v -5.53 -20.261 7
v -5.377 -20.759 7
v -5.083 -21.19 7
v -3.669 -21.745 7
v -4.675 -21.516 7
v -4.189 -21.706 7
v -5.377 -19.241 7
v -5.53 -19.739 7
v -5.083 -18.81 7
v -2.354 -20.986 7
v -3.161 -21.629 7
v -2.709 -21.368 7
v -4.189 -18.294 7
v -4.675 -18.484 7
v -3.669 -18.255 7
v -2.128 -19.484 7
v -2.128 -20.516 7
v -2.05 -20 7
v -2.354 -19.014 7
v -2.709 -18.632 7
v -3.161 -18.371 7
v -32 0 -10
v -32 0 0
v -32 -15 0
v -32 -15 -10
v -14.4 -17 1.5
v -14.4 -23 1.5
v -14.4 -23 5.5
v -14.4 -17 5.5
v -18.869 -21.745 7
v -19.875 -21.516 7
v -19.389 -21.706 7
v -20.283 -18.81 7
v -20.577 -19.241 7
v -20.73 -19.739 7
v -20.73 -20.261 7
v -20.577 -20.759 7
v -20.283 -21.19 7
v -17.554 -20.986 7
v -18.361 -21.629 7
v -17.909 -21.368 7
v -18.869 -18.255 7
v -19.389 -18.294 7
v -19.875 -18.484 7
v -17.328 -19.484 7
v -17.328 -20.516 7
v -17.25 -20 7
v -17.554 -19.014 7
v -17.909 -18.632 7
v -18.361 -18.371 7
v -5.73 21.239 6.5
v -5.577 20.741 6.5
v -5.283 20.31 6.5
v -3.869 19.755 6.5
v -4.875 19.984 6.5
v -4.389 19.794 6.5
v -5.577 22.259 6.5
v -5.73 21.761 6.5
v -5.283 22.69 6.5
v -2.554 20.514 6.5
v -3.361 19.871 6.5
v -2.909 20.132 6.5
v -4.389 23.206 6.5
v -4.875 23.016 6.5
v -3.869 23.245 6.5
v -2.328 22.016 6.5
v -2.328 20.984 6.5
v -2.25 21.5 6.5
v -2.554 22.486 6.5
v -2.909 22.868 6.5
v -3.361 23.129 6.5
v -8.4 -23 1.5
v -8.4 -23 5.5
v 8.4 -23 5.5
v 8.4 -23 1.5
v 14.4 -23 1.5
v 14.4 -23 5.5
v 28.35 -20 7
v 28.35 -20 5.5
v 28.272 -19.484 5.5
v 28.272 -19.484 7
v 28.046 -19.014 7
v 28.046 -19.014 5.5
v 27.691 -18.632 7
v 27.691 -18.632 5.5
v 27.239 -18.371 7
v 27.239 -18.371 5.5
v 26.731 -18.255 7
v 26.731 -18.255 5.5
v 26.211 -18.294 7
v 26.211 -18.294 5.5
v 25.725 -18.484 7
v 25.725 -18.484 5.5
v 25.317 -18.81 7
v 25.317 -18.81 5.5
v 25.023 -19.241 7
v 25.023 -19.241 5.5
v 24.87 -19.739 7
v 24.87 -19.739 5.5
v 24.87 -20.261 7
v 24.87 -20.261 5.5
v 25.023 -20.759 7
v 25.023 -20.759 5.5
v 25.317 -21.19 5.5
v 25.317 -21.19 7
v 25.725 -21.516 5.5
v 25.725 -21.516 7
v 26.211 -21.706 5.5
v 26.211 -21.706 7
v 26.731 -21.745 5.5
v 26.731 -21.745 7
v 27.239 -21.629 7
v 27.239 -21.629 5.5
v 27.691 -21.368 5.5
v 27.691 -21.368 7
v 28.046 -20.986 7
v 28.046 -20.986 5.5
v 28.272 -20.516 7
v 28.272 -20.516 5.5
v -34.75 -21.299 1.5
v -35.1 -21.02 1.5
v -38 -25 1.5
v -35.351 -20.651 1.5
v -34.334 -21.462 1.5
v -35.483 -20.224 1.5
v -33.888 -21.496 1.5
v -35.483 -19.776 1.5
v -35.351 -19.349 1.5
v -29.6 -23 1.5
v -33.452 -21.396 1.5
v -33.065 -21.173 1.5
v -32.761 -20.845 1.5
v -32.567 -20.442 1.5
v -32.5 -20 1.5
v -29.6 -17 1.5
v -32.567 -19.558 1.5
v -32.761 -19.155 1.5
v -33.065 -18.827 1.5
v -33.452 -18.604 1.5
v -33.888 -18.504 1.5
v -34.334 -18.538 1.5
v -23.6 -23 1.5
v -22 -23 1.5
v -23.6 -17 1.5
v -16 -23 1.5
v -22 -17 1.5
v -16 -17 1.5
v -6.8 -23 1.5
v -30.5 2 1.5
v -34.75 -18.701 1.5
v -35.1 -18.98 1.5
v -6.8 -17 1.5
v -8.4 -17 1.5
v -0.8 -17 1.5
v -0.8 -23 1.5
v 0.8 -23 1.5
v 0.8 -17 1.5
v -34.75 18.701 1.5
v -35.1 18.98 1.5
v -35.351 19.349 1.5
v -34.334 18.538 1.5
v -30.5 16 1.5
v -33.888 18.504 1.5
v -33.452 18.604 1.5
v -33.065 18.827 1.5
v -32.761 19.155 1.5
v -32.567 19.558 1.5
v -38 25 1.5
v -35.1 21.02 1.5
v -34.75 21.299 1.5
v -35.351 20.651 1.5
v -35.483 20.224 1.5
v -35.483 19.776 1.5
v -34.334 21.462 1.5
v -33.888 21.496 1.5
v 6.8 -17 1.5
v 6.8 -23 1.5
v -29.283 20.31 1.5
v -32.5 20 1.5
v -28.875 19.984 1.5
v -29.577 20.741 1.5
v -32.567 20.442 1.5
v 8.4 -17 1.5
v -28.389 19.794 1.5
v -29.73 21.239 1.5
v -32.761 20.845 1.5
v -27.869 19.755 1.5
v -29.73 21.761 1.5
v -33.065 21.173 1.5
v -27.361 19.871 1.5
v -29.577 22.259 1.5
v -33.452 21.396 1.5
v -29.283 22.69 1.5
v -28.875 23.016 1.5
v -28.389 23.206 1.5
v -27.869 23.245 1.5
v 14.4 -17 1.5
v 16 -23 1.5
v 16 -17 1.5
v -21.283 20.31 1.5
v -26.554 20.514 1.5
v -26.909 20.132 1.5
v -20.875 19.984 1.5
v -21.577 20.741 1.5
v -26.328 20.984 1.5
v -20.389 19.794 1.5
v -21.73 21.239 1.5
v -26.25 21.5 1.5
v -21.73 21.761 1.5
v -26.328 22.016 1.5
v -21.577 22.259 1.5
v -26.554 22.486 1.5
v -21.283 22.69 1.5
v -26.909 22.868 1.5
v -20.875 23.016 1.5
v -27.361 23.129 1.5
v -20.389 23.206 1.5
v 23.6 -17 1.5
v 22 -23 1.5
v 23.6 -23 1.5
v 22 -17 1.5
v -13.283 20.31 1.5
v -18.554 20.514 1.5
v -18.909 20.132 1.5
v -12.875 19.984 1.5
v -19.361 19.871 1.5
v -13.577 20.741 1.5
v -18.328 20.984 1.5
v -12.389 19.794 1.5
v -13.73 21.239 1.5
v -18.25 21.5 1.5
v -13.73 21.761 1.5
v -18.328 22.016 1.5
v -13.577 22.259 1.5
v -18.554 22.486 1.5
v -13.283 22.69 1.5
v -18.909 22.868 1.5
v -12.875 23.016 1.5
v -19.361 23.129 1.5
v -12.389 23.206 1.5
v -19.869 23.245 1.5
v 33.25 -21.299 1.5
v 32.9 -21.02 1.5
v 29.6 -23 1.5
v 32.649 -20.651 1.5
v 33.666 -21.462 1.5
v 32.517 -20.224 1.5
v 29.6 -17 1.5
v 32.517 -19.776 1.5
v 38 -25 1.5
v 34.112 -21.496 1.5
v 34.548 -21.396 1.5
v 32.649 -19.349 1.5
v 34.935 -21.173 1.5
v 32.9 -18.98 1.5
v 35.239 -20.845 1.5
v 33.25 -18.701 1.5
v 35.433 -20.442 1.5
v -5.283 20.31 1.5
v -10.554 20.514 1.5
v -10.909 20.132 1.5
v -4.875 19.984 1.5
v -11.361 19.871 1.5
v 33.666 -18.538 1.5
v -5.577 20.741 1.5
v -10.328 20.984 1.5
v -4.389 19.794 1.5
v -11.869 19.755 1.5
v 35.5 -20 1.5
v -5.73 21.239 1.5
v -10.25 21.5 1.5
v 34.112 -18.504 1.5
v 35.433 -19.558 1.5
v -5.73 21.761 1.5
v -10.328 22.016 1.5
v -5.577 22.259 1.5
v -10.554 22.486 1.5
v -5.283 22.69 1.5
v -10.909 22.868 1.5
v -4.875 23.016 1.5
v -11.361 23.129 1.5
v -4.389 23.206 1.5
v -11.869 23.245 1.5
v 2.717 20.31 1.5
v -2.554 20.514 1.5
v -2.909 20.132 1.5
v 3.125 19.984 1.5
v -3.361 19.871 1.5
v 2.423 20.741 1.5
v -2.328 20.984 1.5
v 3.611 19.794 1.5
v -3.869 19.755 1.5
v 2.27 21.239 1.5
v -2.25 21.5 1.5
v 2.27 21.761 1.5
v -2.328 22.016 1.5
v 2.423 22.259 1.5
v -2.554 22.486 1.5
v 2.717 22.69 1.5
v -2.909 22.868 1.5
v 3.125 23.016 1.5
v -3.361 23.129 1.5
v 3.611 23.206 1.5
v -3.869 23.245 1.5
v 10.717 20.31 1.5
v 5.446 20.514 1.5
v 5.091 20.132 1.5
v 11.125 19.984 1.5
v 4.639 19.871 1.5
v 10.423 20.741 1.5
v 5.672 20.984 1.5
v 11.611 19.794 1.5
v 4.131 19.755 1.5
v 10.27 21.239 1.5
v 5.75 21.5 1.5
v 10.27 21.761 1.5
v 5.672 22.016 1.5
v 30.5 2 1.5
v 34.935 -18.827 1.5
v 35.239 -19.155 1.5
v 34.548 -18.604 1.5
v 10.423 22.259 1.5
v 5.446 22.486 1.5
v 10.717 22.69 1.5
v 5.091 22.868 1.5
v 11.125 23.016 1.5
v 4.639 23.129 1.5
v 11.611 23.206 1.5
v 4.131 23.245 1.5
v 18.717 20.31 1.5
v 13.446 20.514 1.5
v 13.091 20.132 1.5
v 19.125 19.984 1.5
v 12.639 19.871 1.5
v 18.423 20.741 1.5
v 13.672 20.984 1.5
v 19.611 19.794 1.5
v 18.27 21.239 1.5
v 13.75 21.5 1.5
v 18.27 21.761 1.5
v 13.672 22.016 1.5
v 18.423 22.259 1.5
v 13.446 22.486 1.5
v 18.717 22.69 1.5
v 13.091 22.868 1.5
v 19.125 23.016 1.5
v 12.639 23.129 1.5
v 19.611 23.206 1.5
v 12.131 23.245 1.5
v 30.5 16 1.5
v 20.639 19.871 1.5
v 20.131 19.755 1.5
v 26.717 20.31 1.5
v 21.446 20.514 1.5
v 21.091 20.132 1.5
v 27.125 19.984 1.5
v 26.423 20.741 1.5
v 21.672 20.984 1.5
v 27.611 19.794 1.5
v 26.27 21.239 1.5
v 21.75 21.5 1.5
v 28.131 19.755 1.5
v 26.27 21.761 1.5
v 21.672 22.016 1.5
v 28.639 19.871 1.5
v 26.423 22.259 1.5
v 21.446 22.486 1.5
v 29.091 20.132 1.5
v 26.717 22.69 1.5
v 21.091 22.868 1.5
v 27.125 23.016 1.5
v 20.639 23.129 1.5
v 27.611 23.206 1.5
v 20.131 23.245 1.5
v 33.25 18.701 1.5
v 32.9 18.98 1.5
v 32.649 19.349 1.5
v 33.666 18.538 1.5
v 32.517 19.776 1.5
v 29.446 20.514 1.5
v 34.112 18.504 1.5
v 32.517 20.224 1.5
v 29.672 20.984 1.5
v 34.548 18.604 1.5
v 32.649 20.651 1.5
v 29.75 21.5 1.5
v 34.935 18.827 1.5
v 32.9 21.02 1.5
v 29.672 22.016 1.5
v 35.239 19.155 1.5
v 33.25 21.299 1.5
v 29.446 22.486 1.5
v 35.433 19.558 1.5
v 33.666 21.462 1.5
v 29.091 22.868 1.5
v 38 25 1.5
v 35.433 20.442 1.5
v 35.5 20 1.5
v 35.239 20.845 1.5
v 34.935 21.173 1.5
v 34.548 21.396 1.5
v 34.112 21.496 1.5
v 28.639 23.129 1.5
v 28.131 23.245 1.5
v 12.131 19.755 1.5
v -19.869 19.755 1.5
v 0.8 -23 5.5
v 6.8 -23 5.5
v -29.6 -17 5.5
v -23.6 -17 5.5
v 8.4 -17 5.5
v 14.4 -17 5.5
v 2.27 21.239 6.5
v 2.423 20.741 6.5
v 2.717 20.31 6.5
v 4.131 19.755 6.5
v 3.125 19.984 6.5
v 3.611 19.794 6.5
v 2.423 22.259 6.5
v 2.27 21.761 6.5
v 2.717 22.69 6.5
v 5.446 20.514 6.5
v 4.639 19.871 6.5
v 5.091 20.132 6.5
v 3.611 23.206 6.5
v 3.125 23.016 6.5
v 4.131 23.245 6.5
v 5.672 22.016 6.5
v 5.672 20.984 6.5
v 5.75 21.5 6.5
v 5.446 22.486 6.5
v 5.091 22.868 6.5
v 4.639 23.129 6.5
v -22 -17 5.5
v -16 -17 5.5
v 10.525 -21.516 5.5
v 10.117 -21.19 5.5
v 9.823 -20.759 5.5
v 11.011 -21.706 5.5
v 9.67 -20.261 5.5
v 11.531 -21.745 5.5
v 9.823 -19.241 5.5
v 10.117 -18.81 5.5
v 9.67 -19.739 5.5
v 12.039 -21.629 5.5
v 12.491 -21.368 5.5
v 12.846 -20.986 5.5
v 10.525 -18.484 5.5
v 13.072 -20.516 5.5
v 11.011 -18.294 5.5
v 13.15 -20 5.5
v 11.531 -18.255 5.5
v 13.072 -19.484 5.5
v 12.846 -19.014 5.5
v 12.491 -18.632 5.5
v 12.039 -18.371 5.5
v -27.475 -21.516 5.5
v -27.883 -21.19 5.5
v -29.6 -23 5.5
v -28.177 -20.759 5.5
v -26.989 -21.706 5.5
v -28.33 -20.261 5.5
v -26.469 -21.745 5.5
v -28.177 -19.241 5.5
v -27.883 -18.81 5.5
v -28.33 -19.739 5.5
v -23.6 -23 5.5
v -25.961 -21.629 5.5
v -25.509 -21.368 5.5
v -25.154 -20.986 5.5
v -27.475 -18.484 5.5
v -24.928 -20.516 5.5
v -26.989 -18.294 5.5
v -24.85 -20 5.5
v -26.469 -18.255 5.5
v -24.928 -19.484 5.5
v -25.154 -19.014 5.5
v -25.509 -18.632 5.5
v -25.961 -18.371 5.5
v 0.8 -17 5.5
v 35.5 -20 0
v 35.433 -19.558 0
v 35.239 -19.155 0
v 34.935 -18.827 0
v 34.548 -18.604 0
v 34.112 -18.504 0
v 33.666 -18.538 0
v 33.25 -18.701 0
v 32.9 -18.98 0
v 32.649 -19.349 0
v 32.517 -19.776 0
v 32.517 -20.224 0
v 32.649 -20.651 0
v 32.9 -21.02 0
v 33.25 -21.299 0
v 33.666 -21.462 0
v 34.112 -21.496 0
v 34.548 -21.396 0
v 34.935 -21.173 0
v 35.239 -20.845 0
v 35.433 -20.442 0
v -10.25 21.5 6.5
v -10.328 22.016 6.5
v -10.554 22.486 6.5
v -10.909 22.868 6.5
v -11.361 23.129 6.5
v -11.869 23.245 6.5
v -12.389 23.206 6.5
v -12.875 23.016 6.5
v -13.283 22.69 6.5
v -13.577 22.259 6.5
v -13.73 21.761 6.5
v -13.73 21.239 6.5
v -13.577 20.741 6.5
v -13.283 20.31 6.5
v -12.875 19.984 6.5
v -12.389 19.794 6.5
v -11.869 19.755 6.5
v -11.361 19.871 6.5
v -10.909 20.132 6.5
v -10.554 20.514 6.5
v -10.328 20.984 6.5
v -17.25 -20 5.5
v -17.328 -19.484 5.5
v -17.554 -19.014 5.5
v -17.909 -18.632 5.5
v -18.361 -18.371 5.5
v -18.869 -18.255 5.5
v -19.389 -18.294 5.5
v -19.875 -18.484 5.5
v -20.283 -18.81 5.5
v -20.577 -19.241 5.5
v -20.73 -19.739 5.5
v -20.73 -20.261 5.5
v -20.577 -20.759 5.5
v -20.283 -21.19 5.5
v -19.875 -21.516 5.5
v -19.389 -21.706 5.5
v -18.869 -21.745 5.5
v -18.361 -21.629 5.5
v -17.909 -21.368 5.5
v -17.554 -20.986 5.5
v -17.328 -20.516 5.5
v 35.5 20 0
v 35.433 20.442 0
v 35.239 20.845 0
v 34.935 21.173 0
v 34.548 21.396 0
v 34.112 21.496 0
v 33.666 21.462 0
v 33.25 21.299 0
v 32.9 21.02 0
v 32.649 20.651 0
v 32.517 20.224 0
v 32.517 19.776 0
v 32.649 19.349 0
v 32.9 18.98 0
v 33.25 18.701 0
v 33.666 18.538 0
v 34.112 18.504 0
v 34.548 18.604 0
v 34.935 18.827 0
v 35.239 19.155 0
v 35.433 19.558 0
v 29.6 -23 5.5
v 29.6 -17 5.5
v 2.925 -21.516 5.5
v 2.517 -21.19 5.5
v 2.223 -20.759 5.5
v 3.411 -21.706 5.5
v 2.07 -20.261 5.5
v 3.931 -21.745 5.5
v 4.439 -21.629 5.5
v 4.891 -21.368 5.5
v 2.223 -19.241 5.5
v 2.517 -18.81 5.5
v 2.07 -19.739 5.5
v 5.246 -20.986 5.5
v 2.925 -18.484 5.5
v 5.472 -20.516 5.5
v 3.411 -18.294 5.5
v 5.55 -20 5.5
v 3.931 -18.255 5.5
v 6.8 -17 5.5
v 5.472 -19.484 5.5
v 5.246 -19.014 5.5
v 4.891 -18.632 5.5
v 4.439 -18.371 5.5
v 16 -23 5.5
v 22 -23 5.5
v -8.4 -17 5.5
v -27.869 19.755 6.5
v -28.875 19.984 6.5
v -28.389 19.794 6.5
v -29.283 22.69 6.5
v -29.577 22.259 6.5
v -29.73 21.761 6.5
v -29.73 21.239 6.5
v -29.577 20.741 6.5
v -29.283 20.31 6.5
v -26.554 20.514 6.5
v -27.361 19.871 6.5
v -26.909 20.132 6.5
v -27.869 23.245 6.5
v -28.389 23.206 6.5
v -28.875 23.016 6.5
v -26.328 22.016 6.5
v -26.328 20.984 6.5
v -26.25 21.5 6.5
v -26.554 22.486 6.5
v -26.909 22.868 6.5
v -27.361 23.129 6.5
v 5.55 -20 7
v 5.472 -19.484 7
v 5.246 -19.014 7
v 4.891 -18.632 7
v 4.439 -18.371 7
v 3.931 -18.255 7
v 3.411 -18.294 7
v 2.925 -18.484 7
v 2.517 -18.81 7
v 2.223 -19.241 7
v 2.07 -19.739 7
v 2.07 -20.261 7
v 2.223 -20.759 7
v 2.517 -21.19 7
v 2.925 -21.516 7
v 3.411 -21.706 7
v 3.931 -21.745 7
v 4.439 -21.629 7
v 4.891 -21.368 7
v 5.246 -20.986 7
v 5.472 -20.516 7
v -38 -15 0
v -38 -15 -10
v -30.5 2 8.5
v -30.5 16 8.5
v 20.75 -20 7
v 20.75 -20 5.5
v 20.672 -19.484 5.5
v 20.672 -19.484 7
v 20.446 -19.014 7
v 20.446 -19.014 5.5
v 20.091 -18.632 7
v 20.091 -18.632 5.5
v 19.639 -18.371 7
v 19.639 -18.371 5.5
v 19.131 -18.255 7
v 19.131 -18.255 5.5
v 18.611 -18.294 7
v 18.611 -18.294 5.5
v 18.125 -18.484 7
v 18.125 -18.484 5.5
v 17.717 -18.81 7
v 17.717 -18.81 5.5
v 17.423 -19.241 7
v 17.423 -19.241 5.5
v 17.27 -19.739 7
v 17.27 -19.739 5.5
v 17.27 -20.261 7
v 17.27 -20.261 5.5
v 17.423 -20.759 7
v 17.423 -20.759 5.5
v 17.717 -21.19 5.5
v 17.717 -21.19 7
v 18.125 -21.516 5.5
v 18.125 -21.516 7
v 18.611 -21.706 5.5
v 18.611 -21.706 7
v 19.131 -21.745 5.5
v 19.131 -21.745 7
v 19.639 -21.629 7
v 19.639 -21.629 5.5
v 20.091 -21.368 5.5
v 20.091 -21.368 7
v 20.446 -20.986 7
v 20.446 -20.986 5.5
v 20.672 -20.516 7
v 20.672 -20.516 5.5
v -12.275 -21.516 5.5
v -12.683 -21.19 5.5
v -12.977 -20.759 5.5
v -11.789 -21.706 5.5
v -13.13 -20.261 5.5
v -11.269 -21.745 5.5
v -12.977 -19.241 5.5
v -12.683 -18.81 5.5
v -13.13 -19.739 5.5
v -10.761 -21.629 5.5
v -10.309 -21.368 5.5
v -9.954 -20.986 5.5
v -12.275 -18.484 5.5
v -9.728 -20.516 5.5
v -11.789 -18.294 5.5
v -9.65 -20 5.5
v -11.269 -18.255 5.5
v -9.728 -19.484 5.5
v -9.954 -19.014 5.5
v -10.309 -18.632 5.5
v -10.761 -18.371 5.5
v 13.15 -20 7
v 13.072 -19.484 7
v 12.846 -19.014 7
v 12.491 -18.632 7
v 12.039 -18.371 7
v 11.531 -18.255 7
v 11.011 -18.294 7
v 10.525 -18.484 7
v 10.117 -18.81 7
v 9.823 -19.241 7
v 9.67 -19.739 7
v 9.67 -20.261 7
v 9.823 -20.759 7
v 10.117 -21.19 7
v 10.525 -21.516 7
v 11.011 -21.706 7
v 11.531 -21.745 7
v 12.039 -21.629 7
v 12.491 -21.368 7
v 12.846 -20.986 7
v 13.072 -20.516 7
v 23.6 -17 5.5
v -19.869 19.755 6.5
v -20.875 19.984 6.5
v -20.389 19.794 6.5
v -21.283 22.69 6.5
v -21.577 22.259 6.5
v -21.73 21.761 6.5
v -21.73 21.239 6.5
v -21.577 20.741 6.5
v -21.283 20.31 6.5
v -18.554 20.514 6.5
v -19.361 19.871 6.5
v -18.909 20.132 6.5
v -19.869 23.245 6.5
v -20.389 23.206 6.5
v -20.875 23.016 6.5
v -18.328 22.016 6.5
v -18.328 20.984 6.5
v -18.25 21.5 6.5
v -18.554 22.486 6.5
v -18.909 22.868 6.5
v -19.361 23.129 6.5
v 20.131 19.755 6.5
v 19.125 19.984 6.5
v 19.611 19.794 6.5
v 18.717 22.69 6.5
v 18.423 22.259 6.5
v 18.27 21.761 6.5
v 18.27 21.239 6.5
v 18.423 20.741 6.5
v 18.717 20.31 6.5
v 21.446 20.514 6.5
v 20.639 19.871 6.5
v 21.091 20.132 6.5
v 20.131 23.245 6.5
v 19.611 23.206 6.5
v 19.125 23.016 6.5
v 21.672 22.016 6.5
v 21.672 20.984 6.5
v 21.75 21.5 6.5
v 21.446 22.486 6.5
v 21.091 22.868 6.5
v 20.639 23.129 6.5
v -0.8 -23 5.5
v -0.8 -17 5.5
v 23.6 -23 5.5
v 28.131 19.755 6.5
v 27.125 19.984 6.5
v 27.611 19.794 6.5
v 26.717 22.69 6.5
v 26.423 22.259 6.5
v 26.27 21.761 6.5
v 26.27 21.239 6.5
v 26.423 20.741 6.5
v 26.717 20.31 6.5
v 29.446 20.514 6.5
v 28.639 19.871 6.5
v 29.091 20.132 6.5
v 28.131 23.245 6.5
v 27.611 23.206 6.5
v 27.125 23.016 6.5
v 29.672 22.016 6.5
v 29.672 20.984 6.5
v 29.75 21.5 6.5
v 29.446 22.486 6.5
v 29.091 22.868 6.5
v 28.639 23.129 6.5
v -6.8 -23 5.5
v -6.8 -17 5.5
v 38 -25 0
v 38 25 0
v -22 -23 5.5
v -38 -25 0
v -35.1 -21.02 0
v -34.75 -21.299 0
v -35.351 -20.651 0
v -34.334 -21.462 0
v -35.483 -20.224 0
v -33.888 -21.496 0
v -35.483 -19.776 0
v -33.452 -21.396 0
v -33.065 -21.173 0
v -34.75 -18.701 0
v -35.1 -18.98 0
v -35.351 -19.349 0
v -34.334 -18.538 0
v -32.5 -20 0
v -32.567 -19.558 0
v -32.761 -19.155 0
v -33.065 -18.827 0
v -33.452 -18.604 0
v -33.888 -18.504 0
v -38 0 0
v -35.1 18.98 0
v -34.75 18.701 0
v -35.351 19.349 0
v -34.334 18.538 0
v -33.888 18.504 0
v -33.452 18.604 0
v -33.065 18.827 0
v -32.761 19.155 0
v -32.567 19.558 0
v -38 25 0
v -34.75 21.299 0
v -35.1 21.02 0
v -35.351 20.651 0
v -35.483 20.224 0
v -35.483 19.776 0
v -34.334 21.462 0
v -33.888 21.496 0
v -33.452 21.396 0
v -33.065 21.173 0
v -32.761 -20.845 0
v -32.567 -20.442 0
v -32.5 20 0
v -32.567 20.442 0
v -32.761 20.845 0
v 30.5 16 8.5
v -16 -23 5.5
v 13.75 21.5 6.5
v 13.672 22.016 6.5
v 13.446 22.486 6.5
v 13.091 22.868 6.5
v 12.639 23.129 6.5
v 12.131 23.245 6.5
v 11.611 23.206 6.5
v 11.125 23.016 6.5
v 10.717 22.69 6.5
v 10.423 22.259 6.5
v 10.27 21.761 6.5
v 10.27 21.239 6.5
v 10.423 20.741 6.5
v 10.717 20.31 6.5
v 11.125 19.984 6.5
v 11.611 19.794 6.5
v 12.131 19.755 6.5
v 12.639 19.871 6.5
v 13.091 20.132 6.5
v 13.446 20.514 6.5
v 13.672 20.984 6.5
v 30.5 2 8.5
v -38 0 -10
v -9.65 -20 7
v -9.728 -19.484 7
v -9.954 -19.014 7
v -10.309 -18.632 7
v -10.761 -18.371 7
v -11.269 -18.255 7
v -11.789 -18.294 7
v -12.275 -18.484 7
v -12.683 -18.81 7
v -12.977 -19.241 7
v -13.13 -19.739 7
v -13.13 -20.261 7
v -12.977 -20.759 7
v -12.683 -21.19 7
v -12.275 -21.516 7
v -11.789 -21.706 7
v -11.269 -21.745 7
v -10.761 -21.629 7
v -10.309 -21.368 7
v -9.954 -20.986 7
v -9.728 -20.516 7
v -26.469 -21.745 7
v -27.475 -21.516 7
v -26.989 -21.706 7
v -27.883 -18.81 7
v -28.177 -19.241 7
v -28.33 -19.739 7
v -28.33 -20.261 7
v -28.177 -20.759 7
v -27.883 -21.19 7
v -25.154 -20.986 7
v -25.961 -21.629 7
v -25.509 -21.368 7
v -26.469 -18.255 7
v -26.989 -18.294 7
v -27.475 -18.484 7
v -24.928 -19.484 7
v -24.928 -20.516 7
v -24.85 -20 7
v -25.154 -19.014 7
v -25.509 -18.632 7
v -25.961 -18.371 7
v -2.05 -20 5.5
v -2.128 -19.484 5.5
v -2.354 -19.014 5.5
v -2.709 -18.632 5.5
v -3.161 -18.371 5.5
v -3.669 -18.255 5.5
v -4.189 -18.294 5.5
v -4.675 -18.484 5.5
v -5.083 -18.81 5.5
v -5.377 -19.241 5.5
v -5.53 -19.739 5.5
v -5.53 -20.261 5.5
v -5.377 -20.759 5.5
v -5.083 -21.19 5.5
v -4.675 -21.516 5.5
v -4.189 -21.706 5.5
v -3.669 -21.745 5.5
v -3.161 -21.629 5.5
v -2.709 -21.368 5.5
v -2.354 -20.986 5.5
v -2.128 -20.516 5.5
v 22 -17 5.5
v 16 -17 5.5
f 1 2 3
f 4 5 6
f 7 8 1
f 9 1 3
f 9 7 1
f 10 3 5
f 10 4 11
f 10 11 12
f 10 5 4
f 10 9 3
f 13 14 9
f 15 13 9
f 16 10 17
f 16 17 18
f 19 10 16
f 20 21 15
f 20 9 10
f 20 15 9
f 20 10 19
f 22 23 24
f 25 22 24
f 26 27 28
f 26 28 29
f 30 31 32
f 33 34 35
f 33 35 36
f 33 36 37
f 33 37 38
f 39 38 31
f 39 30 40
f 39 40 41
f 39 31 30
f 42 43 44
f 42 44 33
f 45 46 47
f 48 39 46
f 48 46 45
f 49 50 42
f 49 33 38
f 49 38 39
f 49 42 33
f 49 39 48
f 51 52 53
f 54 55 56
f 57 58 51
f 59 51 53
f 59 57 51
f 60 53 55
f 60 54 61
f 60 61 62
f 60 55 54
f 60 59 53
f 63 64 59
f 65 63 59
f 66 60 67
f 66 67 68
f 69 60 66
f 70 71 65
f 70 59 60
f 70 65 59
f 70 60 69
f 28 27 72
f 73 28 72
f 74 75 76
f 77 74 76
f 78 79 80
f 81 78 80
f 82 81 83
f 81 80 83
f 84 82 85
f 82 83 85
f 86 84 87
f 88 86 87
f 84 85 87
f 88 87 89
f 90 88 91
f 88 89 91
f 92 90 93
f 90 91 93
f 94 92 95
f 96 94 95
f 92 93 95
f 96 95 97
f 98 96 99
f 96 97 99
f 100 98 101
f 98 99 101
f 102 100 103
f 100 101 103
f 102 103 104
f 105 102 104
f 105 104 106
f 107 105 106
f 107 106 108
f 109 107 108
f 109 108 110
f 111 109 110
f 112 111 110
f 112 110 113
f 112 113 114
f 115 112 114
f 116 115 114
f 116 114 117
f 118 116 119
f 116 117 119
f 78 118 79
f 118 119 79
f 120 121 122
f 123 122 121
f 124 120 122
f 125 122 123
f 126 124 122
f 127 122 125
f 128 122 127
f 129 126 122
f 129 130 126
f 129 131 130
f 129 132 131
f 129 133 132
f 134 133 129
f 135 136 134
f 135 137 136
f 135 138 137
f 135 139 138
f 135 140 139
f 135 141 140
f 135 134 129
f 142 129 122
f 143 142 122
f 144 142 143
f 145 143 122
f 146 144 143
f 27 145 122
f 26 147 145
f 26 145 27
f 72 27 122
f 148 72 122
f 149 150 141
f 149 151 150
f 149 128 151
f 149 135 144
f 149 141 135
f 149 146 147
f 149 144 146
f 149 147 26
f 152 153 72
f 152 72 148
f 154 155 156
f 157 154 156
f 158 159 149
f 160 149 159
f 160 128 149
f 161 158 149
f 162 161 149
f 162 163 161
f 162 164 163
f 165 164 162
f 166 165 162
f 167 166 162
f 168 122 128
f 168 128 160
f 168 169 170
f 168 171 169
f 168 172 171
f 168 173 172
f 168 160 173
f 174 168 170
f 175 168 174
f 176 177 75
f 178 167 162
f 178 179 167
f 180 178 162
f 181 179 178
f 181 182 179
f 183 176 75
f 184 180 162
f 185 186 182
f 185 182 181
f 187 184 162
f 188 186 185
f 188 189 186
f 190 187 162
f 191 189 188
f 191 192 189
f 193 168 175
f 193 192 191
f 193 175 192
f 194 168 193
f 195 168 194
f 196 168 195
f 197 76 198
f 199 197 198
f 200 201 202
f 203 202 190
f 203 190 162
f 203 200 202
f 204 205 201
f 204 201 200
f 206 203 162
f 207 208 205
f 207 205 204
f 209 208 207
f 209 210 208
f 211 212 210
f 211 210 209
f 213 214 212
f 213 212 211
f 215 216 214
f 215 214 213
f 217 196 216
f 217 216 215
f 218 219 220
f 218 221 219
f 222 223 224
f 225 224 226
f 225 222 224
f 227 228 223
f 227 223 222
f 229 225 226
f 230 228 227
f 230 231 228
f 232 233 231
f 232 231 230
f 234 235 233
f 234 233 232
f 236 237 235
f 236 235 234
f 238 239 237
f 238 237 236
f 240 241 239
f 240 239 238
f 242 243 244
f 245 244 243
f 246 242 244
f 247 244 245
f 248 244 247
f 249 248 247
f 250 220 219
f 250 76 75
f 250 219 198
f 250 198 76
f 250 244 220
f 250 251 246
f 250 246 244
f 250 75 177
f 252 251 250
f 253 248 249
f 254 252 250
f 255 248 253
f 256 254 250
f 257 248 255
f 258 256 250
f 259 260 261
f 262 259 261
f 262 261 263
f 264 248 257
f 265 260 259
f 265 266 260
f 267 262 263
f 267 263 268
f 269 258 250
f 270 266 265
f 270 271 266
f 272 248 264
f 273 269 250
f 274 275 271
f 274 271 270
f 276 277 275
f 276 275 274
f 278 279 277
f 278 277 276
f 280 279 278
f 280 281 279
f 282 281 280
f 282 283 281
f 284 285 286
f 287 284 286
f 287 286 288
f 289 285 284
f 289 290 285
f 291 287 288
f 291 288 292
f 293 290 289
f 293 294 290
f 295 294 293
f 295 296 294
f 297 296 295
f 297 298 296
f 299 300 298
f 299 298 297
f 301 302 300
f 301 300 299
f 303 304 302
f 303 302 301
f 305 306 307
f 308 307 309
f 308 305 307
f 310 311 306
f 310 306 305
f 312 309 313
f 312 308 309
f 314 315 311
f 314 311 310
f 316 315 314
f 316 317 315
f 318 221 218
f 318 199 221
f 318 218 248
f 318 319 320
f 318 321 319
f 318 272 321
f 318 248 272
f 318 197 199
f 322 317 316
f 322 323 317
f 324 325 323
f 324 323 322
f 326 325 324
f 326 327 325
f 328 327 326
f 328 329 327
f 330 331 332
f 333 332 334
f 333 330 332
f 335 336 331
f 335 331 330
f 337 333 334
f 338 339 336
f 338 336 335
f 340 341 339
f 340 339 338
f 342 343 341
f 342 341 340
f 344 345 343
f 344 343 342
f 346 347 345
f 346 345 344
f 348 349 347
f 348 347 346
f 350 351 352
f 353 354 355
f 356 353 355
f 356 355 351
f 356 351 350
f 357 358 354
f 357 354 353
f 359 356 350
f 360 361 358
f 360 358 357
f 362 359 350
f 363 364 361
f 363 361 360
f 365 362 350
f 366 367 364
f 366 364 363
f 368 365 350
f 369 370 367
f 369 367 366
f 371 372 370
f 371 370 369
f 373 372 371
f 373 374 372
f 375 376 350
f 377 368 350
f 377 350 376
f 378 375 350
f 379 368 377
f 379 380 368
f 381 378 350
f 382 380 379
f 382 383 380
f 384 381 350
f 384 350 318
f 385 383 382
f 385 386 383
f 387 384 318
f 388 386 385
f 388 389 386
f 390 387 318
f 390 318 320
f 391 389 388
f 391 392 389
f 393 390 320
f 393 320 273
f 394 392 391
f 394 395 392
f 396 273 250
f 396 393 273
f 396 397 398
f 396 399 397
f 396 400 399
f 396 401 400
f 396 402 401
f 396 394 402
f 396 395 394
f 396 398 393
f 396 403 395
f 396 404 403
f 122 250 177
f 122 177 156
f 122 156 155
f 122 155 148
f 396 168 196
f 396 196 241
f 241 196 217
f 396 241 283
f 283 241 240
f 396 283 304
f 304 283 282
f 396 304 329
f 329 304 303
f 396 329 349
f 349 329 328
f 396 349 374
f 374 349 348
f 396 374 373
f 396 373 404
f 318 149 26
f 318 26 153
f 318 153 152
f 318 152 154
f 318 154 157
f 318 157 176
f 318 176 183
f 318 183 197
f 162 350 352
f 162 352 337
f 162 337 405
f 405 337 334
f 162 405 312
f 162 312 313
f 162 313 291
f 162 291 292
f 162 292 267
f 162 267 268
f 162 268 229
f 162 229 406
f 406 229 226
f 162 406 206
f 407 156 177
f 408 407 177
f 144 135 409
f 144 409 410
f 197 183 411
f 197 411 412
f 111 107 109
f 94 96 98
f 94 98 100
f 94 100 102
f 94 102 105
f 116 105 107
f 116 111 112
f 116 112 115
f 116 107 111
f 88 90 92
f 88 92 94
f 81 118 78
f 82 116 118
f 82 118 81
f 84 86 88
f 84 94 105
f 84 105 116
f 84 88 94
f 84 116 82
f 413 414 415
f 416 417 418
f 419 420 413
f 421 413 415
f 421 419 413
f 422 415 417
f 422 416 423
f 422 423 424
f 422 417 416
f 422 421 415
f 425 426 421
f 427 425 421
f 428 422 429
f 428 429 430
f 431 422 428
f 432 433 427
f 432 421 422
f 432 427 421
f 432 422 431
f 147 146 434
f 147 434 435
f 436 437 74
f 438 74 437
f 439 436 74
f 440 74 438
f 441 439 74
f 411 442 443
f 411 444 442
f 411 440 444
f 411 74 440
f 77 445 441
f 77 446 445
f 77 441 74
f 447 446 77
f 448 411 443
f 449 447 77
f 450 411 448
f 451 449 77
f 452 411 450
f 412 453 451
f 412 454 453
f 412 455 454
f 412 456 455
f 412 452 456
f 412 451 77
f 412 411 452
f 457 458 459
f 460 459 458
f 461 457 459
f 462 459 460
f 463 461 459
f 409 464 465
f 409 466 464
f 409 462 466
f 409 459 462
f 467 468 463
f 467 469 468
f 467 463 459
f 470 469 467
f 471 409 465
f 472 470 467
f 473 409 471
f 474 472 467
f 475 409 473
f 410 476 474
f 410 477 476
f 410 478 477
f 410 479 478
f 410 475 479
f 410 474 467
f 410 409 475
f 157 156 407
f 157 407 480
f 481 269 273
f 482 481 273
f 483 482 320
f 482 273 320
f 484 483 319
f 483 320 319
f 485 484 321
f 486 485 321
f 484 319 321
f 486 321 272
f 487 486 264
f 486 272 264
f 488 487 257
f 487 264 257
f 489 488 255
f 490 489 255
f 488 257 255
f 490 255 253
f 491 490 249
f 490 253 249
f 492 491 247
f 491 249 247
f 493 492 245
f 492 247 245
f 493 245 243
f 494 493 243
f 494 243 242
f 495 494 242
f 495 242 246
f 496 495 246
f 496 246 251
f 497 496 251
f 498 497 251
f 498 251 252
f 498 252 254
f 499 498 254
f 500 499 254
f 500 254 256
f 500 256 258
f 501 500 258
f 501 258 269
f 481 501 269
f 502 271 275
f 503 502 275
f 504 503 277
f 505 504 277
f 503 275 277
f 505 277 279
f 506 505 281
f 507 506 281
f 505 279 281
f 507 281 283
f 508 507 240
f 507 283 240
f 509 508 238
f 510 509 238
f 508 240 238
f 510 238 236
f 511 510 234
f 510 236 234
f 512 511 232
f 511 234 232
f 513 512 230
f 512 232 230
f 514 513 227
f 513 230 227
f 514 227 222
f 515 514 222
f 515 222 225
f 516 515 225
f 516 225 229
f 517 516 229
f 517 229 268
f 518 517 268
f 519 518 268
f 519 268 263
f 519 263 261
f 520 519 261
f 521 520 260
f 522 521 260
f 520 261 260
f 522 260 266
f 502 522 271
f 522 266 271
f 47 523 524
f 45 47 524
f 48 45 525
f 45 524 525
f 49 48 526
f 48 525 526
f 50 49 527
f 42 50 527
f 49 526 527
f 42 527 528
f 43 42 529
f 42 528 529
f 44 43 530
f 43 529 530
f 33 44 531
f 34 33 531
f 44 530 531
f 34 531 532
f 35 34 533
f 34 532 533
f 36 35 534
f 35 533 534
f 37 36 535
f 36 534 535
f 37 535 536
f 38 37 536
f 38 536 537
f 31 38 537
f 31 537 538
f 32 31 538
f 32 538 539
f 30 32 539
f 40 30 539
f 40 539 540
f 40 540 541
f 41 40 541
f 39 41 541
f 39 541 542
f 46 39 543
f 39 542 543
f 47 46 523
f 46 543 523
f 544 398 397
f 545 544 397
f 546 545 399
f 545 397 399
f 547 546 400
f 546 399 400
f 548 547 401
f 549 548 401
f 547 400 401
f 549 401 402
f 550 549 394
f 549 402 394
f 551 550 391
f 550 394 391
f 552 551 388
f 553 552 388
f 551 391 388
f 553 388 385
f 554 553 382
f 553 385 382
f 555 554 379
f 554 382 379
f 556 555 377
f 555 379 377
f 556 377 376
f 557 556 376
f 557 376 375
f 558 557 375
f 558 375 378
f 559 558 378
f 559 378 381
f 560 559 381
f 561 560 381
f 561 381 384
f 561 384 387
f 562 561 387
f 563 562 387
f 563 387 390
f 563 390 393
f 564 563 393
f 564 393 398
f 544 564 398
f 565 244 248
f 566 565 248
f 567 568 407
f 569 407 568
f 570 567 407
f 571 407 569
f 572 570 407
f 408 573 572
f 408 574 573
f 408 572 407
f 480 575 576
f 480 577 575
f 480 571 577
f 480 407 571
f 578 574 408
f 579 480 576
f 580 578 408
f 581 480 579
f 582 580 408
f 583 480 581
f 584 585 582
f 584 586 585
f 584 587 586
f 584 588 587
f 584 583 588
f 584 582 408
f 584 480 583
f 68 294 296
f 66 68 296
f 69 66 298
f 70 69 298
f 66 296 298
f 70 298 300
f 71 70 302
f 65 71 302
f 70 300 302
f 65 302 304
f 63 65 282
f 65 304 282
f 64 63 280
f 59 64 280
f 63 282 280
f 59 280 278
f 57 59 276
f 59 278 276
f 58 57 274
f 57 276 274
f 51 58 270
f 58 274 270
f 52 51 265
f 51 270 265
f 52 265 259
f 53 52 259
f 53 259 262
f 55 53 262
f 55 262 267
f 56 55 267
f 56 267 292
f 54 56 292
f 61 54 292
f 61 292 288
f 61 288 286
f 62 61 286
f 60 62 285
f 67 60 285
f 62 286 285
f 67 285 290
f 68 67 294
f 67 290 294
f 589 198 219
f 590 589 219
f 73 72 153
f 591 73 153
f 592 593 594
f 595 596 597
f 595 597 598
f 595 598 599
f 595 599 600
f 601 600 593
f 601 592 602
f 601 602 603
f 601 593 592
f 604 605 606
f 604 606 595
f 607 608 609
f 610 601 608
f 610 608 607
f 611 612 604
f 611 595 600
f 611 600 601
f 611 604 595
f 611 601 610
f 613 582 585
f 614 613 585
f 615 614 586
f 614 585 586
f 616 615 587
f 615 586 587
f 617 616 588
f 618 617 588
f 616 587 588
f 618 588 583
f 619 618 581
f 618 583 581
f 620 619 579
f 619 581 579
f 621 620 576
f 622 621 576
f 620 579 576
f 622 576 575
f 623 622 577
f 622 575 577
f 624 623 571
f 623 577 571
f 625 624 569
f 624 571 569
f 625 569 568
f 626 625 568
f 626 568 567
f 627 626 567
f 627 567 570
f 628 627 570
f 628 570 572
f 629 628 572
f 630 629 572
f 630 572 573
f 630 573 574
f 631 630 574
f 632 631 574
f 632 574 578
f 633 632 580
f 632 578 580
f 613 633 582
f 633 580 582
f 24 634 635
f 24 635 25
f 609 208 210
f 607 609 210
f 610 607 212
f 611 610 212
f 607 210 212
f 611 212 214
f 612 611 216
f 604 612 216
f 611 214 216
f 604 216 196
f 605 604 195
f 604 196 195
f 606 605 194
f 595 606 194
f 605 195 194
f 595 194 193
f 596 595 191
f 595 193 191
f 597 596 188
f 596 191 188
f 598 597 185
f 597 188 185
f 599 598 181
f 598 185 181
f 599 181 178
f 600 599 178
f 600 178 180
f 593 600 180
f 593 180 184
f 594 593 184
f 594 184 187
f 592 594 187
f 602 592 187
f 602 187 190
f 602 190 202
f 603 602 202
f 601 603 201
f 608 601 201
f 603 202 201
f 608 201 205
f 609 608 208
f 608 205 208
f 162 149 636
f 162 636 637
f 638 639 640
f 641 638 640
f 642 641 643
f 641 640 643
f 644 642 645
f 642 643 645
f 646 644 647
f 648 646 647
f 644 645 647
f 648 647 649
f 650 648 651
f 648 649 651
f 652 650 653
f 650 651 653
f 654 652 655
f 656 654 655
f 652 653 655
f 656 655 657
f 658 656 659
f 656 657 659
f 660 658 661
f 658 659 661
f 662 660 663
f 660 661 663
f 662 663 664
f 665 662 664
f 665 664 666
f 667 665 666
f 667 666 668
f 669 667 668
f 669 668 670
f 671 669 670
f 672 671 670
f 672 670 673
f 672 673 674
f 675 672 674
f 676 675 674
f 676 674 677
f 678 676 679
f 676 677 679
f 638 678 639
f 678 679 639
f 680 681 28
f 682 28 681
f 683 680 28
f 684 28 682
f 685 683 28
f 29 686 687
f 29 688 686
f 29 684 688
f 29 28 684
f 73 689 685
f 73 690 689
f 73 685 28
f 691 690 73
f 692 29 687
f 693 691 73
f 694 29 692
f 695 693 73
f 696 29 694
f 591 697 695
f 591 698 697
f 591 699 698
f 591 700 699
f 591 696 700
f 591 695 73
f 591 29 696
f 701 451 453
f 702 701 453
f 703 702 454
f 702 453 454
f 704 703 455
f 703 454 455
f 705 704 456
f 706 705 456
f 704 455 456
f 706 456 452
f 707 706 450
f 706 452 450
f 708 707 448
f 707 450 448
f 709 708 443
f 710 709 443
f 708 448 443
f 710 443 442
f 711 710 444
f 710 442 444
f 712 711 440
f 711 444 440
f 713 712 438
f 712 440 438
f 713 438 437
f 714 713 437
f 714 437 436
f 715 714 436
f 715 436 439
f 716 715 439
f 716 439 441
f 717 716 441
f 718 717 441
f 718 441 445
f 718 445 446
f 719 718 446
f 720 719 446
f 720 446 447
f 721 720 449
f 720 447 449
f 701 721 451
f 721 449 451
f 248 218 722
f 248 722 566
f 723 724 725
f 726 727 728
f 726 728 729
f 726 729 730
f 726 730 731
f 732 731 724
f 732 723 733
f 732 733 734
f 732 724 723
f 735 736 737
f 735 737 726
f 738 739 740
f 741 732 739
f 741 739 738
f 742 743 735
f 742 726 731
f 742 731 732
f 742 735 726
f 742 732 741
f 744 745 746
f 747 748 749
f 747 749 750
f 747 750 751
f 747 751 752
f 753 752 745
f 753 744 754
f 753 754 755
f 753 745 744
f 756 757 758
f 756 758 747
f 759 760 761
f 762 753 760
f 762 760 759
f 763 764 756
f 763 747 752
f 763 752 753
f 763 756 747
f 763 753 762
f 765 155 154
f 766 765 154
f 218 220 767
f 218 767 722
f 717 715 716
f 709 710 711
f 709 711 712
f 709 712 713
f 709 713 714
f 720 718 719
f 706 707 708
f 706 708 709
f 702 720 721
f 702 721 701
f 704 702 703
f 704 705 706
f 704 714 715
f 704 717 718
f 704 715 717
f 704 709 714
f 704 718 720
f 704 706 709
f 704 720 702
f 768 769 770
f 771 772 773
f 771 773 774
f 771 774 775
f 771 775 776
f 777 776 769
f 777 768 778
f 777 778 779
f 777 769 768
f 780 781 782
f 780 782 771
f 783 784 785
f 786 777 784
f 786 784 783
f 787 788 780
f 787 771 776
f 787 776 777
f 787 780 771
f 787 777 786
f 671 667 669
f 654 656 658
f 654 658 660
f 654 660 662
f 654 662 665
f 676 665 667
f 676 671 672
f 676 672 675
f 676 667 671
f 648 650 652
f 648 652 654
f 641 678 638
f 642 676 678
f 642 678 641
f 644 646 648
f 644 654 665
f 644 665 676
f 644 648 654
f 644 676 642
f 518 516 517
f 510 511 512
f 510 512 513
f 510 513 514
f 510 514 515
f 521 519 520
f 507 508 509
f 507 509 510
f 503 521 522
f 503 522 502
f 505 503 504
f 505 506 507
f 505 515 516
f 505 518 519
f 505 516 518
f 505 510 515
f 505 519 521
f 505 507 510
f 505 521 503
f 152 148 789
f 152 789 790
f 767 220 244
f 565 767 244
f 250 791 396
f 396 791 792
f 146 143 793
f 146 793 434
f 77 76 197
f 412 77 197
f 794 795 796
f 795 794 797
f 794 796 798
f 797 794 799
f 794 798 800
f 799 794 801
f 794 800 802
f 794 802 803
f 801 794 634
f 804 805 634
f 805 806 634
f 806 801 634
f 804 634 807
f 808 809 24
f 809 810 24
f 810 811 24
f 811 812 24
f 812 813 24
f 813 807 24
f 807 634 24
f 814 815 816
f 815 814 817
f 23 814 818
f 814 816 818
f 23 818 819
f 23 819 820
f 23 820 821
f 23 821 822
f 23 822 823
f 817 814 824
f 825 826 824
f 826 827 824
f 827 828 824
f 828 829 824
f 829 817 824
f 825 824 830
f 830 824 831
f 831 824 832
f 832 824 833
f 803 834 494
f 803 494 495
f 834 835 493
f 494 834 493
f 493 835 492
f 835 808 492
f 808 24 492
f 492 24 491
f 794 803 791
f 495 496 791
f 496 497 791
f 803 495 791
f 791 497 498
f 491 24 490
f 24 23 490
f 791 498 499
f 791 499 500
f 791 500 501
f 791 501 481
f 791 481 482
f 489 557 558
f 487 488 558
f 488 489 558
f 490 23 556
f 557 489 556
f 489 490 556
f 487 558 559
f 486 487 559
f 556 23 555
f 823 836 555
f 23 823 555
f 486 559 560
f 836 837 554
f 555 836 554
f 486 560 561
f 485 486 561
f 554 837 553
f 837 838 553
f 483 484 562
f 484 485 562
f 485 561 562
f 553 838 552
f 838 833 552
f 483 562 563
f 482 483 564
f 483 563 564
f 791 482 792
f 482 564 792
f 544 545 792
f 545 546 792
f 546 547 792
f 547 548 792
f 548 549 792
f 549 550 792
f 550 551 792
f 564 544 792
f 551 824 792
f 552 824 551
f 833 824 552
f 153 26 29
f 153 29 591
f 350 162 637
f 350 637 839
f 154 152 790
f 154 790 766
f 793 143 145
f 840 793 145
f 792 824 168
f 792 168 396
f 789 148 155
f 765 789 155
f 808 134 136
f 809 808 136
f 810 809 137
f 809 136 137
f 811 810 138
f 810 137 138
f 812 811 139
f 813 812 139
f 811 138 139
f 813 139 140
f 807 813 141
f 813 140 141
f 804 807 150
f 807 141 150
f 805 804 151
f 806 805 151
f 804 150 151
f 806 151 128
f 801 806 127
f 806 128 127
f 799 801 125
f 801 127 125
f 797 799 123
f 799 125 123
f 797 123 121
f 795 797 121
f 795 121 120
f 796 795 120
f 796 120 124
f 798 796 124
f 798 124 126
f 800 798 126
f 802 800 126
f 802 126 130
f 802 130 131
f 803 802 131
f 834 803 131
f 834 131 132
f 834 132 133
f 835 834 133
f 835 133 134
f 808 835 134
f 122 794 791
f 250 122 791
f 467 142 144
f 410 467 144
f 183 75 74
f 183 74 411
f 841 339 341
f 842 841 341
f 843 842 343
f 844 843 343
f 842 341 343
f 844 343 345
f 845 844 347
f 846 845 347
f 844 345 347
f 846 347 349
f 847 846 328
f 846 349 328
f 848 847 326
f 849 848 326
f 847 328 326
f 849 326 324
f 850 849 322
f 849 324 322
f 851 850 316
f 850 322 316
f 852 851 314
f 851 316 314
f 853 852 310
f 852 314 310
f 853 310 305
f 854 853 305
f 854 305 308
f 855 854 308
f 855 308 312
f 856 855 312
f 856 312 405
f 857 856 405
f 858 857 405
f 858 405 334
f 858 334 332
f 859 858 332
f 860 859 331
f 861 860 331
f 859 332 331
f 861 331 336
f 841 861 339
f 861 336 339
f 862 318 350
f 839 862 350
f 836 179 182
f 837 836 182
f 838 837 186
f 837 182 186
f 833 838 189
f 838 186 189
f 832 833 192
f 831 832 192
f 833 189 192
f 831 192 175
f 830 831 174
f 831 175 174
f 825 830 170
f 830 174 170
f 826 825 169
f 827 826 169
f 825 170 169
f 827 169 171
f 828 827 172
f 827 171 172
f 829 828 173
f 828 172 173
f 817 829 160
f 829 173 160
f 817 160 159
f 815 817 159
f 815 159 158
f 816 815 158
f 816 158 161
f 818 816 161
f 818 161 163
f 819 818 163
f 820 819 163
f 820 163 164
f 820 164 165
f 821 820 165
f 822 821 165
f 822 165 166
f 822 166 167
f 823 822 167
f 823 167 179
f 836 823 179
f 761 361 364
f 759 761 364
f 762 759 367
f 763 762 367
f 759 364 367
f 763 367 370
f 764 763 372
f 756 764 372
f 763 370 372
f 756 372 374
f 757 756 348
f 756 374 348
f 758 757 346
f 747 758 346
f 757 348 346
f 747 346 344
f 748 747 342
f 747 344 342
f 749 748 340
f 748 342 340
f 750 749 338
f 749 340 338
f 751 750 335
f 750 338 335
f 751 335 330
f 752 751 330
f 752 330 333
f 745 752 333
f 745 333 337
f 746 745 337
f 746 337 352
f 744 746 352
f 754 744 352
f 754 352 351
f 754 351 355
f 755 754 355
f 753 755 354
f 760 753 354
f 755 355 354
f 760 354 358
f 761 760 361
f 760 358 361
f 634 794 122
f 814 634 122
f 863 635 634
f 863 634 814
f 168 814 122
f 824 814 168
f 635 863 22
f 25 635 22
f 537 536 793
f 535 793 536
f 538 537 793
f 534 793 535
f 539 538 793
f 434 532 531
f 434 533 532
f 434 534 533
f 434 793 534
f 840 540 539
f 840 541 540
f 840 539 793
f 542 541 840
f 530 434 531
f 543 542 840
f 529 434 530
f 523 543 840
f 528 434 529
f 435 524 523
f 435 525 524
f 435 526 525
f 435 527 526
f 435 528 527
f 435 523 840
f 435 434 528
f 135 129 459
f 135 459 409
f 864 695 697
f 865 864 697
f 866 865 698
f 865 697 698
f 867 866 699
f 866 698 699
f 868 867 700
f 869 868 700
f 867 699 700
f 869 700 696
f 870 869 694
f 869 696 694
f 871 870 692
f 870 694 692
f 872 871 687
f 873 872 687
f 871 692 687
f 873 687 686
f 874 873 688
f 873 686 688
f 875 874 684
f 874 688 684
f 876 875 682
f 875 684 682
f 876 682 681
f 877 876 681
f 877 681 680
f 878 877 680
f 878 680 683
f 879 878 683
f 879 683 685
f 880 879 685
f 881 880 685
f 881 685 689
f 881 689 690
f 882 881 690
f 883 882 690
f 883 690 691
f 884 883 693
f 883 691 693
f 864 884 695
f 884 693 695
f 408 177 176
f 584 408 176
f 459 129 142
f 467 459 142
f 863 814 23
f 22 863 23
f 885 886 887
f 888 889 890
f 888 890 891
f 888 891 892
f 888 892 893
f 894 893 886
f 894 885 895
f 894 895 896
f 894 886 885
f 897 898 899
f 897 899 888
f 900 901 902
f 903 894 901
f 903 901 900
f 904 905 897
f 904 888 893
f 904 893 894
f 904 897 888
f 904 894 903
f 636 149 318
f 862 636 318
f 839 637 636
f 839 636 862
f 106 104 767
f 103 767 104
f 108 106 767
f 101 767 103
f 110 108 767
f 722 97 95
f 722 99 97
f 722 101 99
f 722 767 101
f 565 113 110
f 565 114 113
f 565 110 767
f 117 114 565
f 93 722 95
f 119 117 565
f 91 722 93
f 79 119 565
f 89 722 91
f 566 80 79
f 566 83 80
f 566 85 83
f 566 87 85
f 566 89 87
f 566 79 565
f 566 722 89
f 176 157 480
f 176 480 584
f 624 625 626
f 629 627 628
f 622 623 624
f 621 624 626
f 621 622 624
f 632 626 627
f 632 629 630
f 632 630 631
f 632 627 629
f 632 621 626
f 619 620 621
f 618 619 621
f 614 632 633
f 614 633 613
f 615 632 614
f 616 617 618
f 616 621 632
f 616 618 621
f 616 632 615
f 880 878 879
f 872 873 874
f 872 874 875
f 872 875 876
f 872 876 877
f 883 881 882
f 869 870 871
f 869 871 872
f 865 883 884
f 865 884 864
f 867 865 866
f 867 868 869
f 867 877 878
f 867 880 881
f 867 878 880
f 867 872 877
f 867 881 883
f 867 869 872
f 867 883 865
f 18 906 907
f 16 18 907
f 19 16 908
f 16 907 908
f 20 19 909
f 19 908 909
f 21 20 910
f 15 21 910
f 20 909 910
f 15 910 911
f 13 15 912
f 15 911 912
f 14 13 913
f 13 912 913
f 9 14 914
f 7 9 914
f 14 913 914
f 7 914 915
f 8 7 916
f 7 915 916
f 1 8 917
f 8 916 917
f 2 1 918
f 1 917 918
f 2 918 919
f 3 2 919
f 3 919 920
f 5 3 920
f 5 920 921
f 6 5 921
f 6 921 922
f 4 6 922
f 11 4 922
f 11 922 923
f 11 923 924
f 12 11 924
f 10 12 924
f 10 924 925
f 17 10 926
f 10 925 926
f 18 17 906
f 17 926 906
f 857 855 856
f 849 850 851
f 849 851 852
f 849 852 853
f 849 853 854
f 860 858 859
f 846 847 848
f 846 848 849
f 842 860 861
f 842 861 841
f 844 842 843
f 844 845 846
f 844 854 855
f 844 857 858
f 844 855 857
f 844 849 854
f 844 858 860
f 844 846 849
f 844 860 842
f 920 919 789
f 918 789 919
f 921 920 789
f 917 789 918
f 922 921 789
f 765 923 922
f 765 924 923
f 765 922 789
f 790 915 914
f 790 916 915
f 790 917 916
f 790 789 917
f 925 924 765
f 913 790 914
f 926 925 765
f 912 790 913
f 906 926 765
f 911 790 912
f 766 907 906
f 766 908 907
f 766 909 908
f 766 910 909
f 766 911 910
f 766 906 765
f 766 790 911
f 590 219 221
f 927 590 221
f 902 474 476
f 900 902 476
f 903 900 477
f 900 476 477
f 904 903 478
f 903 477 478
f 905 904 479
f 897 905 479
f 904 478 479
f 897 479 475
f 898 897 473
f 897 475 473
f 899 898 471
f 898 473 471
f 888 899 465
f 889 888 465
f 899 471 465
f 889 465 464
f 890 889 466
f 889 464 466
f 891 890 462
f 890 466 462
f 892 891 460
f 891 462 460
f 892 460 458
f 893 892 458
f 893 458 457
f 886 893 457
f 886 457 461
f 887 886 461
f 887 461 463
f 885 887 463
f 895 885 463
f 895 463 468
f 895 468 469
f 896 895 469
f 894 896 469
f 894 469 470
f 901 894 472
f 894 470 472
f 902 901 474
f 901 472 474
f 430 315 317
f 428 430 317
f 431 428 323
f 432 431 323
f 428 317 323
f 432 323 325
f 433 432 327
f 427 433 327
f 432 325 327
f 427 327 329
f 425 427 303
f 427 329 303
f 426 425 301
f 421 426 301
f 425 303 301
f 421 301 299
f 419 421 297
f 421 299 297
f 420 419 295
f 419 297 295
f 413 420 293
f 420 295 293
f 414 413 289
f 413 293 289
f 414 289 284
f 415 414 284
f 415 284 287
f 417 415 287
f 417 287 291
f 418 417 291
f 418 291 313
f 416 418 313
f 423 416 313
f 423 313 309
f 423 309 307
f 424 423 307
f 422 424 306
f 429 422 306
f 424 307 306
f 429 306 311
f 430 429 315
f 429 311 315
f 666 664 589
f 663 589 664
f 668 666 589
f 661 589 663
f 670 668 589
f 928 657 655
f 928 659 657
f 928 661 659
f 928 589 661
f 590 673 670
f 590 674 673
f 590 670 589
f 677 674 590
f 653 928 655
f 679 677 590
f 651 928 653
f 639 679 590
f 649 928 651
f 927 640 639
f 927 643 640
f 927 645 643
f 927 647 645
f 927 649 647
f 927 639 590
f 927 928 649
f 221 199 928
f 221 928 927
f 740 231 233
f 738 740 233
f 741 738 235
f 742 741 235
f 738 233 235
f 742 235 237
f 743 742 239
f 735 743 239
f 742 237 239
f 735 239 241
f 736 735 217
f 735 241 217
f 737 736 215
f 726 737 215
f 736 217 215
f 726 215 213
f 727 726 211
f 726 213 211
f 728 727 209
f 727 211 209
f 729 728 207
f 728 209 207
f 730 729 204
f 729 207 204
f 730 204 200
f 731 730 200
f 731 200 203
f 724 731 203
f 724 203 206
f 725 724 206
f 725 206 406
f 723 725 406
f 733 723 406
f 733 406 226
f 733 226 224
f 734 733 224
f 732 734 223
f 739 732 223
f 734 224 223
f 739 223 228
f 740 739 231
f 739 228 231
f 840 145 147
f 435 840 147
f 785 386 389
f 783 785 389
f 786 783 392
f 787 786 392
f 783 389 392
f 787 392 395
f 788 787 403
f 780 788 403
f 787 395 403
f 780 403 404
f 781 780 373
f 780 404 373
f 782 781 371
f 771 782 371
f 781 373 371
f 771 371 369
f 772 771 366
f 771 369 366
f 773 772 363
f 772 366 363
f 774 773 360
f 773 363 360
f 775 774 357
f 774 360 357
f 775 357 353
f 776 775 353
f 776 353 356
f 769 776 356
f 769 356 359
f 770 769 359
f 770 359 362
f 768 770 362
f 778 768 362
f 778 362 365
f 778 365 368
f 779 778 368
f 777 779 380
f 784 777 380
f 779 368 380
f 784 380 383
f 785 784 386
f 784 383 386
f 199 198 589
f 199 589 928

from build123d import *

# Parameters (mm, degrees)
SKETCH_W     = 76
SKETCH_H     = 50
PAD_DEPTH    = 1.5
SKETCH001_R  = 1.5
POCKET_DEPTH = 1.501
SKETCH002_R  = 1.75
PAD001_DEPTH = 5
SKETCH003_W  = 61
SKETCH003_H  = 14
PAD002_DEPTH = 7
SKETCH004_W  = 6
SKETCH004_H  = 15
PAD003_DEPTH = 10
SKETCH005_W  = 6
SKETCH005_H  = 6
PAD004_DEPTH = 4
SKETCH006_R  = 1.75
PAD005_DEPTH = 1.5


with BuildPart() as part:
    # Sketch → Pad (new body)
    with BuildSketch(Plane.XY):
        Rectangle(SKETCH_W, SKETCH_H)
    extrude(amount=PAD_DEPTH)

    # Sketch001 (on Face6 of Pad) → Pocket (cut, through all)
    with BuildSketch(Plane.XY.offset(1.5)):
        with Locations((-34, 20)):
            Circle(SKETCH001_R)
        with Locations((34, 20)):
            Circle(SKETCH001_R)
        with Locations((-34, -20)):
            Circle(SKETCH001_R)
        with Locations((34, -20)):
            Circle(SKETCH001_R)
    extrude(amount=-POCKET_DEPTH, mode=Mode.SUBTRACT)

    # Sketch002 (on Face5 of Pocket) → Pad001 (join)
    with BuildSketch(Plane.XY.offset(1.5)):
        with Locations((-28, 21.5)):
            Circle(SKETCH002_R)
        with Locations((-20, 21.5)):
            Circle(SKETCH002_R)
        with Locations((-12, 21.5)):
            Circle(SKETCH002_R)
        with Locations((-4, 21.5)):
            Circle(SKETCH002_R)
        with Locations((4, 21.5)):
            Circle(SKETCH002_R)
        with Locations((12, 21.5)):
            Circle(SKETCH002_R)
        with Locations((20, 21.5)):
            Circle(SKETCH002_R)
        with Locations((28, 21.5)):
            Circle(SKETCH002_R)
    extrude(amount=PAD001_DEPTH)

    # Sketch003 (on Face5 of Pad001) → Pad002 (join)
    with BuildSketch(Plane.XY.offset(1.5)):
        with Locations((0, 9)):
            Rectangle(SKETCH003_W, SKETCH003_H)
    extrude(amount=PAD002_DEPTH)

    # Sketch004 (on Face4 of Pad002) → Pad003 (join)
    with BuildSketch(Plane(origin=(0, 0, 0), x_dir=(1, 0, 0), z_dir=(0, 0, -1))):
        with Locations((-35, 7.5)):
            Rectangle(SKETCH004_W, SKETCH004_H)
    extrude(amount=PAD003_DEPTH)

    # Sketch005 (on Face5 of Pad003) → Pad004 (join)
    with BuildSketch(Plane.XY.offset(1.5)):
        with Locations((-26.6, -20)):
            Rectangle(SKETCH005_W, SKETCH005_H)
        with Locations((-19, -20)):
            Rectangle(SKETCH005_W, SKETCH005_H)
        with Locations((-11.4, -20)):
            Rectangle(SKETCH005_W, SKETCH005_H)
        with Locations((-3.8, -20)):
            Rectangle(SKETCH005_W, SKETCH005_H)
        with Locations((3.8, -20)):
            Rectangle(SKETCH005_W, SKETCH005_H)
        with Locations((11.4, -20)):
            Rectangle(SKETCH005_W, SKETCH005_H)
        with Locations((19, -20)):
            Rectangle(SKETCH005_W, SKETCH005_H)
        with Locations((26.6, -20)):
            Rectangle(SKETCH005_W, SKETCH005_H)
    extrude(amount=PAD004_DEPTH)

    # Sketch006 (on Face67 of Pad004) → Pad005 (join)
    with BuildSketch(Plane.XY.offset(5.5)):
        with Locations((-26.6, -20)):
            Circle(SKETCH006_R)
        with Locations((-19, -20)):
            Circle(SKETCH006_R)
        with Locations((-11.4, -20)):
            Circle(SKETCH006_R)
        with Locations((-3.8, -20)):
            Circle(SKETCH006_R)
        with Locations((3.8, -20)):
            Circle(SKETCH006_R)
        with Locations((11.4, -20)):
            Circle(SKETCH006_R)
        with Locations((19, -20)):
            Circle(SKETCH006_R)
        with Locations((26.6, -20)):
            Circle(SKETCH006_R)
    extrude(amount=PAD005_DEPTH)


solid = part.part
